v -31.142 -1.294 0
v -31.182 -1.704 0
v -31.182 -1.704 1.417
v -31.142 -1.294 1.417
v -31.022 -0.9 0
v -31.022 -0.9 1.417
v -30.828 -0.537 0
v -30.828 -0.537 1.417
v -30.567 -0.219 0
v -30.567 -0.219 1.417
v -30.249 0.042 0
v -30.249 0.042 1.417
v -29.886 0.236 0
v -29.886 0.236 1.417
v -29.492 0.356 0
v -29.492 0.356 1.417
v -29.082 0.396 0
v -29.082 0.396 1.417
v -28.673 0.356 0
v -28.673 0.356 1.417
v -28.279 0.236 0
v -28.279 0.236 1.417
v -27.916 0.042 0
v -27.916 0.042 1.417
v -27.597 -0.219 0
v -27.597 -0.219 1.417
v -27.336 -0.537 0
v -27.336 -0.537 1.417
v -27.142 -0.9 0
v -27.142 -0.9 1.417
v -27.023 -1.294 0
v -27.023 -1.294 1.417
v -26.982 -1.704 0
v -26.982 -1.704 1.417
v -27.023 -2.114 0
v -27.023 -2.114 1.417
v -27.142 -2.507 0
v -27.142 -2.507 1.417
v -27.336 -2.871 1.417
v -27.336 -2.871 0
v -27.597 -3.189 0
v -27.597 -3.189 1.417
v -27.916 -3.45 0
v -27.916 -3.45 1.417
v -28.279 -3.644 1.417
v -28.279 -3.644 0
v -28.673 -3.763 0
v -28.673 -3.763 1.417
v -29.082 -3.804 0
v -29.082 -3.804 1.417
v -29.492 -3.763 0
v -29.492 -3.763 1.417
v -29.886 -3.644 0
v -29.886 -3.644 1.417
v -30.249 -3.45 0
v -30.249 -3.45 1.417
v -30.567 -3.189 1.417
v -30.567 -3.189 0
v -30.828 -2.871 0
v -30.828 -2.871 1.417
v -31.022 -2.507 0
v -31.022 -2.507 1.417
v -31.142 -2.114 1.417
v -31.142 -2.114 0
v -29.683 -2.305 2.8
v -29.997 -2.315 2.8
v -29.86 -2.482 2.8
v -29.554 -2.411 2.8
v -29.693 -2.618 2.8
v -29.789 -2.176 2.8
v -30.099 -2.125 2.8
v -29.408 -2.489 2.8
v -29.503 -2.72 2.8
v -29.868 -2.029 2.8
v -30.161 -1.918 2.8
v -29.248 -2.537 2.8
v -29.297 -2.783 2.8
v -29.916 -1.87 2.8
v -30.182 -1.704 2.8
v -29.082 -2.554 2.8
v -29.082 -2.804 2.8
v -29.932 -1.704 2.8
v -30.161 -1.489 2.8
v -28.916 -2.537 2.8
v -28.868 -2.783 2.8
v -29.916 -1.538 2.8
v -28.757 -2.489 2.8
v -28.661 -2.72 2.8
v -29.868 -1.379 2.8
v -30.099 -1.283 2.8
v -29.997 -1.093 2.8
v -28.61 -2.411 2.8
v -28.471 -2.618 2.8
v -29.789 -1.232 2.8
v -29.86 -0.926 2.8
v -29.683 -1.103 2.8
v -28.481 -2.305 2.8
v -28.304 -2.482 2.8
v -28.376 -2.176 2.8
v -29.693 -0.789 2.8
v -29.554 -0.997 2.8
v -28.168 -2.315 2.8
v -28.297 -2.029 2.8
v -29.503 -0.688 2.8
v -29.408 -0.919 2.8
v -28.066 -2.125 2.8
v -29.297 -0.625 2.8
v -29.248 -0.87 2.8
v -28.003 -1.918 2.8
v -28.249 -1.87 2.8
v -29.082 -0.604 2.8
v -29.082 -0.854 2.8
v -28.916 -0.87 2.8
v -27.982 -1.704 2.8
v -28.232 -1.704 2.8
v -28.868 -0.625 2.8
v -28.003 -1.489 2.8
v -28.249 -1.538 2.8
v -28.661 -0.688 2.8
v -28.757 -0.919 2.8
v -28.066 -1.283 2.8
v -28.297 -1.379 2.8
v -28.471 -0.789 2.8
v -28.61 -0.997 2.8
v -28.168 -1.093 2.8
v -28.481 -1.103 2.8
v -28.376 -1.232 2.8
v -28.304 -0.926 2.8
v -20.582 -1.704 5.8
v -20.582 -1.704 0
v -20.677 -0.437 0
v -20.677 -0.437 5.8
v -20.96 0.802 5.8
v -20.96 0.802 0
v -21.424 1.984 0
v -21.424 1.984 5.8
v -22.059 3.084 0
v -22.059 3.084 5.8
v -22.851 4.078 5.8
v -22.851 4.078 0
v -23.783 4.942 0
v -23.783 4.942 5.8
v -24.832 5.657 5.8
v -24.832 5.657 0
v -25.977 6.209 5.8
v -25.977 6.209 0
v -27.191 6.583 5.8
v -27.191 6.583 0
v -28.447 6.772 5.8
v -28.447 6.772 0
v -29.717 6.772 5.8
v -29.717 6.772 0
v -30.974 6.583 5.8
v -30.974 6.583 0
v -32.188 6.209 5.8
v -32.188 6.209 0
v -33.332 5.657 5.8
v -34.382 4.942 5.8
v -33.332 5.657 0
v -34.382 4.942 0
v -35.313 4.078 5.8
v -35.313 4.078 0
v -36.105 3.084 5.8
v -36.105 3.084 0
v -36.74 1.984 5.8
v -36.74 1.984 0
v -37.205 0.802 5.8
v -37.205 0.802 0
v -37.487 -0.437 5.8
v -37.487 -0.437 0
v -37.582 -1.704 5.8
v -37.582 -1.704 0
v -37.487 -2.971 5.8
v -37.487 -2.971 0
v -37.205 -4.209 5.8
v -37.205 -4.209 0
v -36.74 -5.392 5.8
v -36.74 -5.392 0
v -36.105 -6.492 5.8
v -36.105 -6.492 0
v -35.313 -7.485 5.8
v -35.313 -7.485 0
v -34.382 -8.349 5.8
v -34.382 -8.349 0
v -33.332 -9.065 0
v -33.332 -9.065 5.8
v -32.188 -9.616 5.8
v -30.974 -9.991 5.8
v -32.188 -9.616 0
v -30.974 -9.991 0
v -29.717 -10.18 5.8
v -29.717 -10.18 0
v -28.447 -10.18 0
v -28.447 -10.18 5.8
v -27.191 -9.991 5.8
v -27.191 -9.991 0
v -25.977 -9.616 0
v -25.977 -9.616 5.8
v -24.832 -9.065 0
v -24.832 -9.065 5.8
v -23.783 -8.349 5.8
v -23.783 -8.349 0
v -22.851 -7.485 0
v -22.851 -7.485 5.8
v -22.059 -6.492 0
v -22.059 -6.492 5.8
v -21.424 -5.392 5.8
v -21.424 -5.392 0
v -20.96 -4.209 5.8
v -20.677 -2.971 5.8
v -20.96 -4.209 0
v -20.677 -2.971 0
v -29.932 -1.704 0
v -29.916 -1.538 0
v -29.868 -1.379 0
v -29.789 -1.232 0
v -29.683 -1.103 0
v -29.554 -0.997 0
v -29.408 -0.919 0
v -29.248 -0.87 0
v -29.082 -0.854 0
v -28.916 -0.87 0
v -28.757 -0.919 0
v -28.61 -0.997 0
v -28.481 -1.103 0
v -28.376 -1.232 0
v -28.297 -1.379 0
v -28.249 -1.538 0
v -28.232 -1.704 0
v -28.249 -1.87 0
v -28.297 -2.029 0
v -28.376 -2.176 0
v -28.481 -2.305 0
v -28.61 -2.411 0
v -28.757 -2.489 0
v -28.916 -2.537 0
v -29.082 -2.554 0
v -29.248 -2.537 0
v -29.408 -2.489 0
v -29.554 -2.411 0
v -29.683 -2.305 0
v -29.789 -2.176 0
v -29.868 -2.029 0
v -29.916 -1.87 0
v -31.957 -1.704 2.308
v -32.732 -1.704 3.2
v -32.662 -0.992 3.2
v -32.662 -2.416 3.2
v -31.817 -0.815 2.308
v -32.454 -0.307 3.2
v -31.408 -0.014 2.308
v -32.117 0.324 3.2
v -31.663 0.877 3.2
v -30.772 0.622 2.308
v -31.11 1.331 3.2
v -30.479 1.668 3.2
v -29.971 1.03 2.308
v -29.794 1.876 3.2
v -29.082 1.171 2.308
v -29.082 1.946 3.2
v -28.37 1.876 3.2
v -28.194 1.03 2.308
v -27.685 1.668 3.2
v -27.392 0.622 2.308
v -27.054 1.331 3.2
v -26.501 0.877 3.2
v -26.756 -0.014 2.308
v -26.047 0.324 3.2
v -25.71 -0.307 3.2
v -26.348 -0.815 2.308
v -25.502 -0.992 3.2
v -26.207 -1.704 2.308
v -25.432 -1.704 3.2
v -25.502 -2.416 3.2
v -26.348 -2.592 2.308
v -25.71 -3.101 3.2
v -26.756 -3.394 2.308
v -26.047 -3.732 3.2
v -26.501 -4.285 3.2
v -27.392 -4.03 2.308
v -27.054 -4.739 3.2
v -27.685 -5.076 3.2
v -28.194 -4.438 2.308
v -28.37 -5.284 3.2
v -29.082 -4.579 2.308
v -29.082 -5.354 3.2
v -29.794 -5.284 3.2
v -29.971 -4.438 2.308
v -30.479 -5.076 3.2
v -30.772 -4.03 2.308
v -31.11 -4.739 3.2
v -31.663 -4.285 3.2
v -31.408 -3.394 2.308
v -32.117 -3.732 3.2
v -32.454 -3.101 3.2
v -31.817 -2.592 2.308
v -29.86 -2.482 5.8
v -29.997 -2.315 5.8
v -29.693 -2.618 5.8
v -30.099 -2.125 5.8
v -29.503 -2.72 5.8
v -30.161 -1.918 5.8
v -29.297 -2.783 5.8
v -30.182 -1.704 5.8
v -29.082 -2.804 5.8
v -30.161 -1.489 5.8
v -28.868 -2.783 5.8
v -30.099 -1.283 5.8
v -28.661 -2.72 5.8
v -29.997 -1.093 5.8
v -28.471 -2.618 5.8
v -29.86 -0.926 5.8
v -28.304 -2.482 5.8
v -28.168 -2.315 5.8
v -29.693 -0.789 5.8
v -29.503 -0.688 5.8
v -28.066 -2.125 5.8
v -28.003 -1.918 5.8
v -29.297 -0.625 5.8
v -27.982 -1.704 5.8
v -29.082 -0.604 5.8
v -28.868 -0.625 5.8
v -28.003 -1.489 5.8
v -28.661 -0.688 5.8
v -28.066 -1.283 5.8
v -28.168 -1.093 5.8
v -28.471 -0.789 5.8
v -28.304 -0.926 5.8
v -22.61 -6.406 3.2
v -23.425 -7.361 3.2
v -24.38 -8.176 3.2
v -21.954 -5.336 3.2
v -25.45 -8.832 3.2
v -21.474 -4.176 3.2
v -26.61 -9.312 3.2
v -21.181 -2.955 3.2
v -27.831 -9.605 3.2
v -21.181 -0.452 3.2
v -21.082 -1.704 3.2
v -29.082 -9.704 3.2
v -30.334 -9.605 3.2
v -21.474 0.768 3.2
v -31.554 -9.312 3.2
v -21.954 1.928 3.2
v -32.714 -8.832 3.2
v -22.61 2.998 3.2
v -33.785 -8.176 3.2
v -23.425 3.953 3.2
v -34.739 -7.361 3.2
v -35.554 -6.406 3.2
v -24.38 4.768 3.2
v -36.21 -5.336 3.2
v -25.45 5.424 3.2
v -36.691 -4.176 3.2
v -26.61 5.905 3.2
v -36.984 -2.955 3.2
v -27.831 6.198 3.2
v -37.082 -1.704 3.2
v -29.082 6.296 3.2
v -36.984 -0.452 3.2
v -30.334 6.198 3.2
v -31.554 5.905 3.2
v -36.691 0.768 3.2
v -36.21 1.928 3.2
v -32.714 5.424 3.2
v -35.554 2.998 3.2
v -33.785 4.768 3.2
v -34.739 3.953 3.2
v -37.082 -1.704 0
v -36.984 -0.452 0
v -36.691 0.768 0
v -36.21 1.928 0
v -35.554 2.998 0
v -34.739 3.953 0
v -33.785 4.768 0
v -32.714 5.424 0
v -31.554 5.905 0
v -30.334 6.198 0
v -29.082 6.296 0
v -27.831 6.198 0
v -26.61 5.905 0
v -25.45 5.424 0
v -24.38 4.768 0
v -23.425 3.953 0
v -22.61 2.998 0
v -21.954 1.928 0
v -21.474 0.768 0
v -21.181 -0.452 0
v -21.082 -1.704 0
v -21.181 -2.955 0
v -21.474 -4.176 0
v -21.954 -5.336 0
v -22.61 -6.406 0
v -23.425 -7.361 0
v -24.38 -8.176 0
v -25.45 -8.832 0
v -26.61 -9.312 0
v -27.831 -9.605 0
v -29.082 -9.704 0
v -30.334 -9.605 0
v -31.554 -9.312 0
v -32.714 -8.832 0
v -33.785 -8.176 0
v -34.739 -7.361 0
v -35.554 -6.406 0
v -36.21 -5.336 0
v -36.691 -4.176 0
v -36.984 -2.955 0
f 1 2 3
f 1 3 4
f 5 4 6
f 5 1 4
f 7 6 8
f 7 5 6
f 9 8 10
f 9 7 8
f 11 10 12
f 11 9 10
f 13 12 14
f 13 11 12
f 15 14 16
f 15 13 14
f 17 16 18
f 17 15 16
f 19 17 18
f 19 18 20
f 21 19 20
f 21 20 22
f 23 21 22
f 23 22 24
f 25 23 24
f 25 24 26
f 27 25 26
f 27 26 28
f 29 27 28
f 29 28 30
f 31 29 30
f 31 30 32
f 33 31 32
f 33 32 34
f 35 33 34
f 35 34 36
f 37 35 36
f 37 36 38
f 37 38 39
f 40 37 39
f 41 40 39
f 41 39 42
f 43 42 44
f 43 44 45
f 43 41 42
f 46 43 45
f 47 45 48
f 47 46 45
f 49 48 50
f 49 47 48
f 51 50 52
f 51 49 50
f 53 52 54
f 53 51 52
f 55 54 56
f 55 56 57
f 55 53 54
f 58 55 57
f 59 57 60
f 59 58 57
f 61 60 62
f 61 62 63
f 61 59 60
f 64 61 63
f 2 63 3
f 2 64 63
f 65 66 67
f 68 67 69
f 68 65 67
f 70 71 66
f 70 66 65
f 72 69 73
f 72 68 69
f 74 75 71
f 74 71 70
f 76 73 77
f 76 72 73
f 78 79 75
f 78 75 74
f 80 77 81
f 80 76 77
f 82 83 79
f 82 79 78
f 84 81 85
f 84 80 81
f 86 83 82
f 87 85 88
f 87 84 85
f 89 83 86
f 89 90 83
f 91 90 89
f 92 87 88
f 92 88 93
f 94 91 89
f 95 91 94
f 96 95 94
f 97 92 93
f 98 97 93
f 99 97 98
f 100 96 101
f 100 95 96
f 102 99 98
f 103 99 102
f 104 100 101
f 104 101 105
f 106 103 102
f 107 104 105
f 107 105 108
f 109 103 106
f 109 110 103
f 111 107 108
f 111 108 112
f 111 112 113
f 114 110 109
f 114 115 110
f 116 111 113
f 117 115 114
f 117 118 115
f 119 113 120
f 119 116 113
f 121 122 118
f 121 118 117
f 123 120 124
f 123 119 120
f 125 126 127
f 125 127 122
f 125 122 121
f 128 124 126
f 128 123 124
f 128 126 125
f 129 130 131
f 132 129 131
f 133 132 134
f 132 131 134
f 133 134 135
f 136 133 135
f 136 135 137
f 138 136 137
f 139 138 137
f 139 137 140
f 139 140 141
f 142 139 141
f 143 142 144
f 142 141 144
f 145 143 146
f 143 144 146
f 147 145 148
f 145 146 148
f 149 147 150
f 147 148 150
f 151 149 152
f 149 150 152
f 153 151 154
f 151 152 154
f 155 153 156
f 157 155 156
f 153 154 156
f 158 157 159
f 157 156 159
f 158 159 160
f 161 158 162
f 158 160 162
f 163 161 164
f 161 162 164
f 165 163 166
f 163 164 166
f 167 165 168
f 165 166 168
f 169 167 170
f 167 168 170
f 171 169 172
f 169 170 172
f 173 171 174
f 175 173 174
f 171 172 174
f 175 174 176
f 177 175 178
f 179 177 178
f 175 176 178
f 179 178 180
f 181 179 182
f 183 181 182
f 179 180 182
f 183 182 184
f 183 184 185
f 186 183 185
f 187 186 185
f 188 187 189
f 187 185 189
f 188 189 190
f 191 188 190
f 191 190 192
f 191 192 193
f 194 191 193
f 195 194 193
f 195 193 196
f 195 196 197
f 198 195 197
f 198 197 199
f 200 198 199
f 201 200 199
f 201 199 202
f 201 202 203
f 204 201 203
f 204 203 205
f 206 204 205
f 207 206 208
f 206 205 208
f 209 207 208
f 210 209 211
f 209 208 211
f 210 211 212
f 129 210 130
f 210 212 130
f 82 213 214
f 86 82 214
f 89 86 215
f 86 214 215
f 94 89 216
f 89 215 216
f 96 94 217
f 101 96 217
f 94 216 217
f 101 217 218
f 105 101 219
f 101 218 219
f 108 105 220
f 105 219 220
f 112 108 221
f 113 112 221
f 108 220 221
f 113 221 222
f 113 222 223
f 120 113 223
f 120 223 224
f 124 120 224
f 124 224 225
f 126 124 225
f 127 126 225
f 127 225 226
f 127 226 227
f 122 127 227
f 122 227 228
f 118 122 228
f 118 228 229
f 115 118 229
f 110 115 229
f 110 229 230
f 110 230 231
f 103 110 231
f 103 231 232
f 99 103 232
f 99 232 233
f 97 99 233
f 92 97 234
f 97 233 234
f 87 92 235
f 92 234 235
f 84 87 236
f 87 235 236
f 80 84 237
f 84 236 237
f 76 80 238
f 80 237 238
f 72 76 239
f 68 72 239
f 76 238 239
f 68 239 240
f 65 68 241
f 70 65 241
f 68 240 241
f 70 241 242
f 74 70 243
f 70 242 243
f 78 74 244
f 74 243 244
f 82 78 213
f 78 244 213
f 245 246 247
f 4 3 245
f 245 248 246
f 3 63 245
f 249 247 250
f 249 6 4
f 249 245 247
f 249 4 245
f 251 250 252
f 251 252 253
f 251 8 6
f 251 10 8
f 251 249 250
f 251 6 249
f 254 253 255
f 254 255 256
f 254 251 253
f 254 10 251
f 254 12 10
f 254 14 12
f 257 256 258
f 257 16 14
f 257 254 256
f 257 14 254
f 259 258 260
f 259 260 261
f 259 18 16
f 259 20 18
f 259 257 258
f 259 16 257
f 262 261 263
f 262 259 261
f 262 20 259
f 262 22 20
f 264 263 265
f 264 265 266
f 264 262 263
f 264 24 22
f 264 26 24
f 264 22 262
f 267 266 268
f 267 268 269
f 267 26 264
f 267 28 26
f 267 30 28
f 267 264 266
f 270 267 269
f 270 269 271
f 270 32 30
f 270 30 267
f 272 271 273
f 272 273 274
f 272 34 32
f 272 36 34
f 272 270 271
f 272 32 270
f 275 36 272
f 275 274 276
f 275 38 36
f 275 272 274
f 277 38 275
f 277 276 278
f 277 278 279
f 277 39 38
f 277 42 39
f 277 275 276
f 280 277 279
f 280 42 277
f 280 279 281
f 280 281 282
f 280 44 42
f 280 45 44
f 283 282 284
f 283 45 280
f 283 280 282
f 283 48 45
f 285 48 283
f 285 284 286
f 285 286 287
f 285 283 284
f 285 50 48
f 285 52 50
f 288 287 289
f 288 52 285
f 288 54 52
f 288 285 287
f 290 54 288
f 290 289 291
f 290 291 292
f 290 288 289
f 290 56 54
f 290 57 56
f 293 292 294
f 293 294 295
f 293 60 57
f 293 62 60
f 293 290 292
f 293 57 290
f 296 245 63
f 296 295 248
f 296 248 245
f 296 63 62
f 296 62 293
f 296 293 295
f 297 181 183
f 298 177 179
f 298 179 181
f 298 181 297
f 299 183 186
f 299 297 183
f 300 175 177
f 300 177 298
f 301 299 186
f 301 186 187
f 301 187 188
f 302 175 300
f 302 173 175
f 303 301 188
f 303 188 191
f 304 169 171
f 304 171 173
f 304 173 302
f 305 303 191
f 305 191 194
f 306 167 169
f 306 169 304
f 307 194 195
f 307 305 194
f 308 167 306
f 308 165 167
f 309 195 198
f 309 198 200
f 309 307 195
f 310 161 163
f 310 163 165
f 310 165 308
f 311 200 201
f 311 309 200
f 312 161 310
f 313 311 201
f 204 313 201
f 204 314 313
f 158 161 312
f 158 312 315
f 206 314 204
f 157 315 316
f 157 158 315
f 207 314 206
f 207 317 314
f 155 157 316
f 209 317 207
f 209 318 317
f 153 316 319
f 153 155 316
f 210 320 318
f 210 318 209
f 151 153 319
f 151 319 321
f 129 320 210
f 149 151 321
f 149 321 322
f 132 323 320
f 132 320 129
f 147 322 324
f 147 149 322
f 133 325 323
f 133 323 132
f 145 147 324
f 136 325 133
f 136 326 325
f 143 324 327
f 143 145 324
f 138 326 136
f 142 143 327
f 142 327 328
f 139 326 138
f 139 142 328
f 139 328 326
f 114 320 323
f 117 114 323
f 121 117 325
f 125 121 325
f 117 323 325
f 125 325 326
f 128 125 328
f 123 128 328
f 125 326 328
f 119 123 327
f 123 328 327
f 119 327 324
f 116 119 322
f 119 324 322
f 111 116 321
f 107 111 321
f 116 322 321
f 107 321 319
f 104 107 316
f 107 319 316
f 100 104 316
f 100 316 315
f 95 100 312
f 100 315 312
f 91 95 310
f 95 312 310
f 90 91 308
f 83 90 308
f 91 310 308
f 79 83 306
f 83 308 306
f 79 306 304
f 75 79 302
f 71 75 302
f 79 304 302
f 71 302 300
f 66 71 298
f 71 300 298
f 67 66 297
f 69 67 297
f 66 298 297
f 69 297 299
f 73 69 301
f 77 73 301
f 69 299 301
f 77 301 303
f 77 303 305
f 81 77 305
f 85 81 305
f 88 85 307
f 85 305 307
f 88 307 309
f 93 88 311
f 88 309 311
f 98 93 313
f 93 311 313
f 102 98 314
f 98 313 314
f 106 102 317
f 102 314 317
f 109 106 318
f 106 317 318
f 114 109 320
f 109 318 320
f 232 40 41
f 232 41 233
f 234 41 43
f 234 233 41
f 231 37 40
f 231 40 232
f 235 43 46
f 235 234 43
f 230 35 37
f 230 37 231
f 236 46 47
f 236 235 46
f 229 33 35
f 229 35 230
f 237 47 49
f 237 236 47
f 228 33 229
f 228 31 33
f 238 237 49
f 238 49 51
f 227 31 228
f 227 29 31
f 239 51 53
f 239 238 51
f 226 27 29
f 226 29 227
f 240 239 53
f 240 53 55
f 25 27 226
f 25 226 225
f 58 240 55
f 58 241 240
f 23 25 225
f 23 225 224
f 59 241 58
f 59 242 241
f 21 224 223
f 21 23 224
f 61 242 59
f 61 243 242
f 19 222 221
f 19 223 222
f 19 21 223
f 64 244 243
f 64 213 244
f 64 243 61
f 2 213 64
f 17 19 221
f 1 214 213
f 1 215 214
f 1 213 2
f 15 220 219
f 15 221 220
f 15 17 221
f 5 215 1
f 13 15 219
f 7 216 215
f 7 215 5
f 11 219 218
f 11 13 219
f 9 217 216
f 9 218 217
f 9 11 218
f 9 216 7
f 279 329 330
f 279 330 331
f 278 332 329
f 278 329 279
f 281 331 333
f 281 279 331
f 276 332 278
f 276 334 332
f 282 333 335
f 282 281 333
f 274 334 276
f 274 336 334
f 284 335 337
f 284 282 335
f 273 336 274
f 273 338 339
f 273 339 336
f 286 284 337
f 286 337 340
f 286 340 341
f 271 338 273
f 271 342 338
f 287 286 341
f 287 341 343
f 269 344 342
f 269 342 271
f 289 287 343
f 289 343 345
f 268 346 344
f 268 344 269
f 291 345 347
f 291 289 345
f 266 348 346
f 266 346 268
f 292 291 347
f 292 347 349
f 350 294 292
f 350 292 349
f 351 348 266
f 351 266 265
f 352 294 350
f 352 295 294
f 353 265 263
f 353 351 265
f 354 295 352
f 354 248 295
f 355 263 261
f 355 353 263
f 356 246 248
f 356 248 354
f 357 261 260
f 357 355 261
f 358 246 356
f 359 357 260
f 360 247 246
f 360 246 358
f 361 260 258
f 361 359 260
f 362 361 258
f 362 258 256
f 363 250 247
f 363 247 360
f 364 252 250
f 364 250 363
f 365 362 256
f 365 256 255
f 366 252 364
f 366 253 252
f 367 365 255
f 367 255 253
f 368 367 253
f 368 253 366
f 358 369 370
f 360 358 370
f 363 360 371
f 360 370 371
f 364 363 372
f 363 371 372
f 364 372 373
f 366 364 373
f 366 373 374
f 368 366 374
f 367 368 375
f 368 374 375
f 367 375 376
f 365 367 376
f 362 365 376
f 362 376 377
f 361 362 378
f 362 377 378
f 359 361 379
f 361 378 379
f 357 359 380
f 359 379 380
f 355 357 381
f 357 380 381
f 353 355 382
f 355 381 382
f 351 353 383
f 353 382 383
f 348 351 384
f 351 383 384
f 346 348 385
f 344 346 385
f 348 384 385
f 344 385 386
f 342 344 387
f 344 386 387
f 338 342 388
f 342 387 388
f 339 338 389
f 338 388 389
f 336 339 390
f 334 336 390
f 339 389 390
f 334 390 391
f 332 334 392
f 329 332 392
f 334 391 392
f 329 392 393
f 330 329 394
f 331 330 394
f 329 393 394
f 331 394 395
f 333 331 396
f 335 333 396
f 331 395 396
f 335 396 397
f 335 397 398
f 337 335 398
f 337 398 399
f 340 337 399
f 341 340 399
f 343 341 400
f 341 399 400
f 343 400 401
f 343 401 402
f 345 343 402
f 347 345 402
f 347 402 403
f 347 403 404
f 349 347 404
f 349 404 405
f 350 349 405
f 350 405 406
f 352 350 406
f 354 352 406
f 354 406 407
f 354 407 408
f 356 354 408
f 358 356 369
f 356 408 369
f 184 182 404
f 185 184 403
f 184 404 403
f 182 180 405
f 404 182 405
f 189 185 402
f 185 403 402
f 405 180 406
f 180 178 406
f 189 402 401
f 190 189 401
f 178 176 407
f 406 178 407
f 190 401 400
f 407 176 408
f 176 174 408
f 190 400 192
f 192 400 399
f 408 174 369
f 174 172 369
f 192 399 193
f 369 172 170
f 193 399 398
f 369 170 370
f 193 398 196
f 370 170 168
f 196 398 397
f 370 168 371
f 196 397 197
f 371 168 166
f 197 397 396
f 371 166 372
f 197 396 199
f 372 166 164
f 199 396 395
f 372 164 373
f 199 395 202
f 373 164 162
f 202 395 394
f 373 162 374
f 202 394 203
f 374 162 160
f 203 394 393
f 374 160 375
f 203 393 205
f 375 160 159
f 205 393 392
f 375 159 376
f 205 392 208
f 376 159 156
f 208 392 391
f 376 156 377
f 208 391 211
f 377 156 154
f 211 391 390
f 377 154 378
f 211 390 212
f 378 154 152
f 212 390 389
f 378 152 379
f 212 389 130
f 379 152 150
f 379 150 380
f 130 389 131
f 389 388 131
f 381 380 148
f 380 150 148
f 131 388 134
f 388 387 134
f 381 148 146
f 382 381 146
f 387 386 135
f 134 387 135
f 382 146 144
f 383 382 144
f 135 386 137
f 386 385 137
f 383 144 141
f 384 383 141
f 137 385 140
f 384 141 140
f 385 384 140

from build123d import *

# Parameters (mm, degrees)
SKETCH1_R           = 8.5
BOSS_EXTRUDE1_DEPTH = 5.8
SKETCH2_R           = 8
CUT_EXTRUDE1_DEPTH  = 3.2
SKETCH3_R           = 1
BOSS_EXTRUDE2_DEPTH = 3.2
CHAMFER1_SIZE       = 2.65
CHAMFER1_SIZE2      = 3.048476279
SKETCH4_R           = 2.1
BOSS_EXTRUDE3_DEPTH = 3
SKETCH5_R           = 0.85
CUT_EXTRUDE2_DEPTH  = 40.372371259
SKETCH6_R           = 1.1
CUT_EXTRUDE3_DEPTH  = 3


with BuildPart() as part:
    # Sketch1 → Boss-Extrude1 (new body)
    with BuildSketch(Plane.XY):
        with Locations((-29.082250471, -1.703826149)):
            Circle(SKETCH1_R)
    extrude(amount=BOSS_EXTRUDE1_DEPTH)

    # Sketch2 → Cut-Extrude1 (cut)
    with BuildSketch(Plane(origin=(0, 0, 0), x_dir=(-1, 0, 0), z_dir=(0, 0, -1))):
        with Locations((29.082250471, -1.703826149)):
            Circle(SKETCH2_R)
    extrude(amount=-CUT_EXTRUDE1_DEPTH, mode=Mode.SUBTRACT)

    # Sketch3 → Boss-Extrude2 (add)
    with BuildSketch(Plane(origin=(0, 0, 3.2), x_dir=(-1, 0, 0), z_dir=(0, 0, -1))):
        with Locations((29.082250471, -1.703826149)):
            Circle(SKETCH3_R)
    extrude(amount=BOSS_EXTRUDE2_DEPTH)

    # Chamfer1
    chamfer1_edges = [part.edges().sort_by_distance(p)[0] for p in [
        (-28.082250471, -1.703826149, 3.2),
    ]]
    chamfer1_side = [part.faces().sort_by_distance(p)[0] for p in [
        (-21.308524641, -1.703826149, 3.2),
    ]]
    chamfer(chamfer1_edges, length=CHAMFER1_SIZE, length2=CHAMFER1_SIZE2, reference=chamfer1_side[0])

    # Sketch4 → Boss-Extrude3 (add)
    with BuildSketch(Plane(origin=(0, 0, 0), x_dir=(-1, 0, 0), z_dir=(0, 0, -1))):
        with Locations((29.082250471, -1.703826149)):
            Circle(SKETCH4_R)
    extrude(amount=-BOSS_EXTRUDE3_DEPTH)

    # Sketch5 → Cut-Extrude2 (cut, through all)
    with BuildSketch(Plane(origin=(0, 0, 0), x_dir=(-1, 0, 0), z_dir=(0, 0, -1))):
        with Locations((29.082250471, -1.703826149)):
            Circle(SKETCH5_R)
    extrude(amount=-CUT_EXTRUDE2_DEPTH, mode=Mode.SUBTRACT)

    # Sketch6 → Cut-Extrude3 (cut)
    with BuildSketch(Plane.XY.offset(5.8)):
        with Locations((-29.082250471, -1.703826149)):
            Circle(SKETCH6_R)
    extrude(amount=-CUT_EXTRUDE3_DEPTH, mode=Mode.SUBTRACT)


solid = part.part
